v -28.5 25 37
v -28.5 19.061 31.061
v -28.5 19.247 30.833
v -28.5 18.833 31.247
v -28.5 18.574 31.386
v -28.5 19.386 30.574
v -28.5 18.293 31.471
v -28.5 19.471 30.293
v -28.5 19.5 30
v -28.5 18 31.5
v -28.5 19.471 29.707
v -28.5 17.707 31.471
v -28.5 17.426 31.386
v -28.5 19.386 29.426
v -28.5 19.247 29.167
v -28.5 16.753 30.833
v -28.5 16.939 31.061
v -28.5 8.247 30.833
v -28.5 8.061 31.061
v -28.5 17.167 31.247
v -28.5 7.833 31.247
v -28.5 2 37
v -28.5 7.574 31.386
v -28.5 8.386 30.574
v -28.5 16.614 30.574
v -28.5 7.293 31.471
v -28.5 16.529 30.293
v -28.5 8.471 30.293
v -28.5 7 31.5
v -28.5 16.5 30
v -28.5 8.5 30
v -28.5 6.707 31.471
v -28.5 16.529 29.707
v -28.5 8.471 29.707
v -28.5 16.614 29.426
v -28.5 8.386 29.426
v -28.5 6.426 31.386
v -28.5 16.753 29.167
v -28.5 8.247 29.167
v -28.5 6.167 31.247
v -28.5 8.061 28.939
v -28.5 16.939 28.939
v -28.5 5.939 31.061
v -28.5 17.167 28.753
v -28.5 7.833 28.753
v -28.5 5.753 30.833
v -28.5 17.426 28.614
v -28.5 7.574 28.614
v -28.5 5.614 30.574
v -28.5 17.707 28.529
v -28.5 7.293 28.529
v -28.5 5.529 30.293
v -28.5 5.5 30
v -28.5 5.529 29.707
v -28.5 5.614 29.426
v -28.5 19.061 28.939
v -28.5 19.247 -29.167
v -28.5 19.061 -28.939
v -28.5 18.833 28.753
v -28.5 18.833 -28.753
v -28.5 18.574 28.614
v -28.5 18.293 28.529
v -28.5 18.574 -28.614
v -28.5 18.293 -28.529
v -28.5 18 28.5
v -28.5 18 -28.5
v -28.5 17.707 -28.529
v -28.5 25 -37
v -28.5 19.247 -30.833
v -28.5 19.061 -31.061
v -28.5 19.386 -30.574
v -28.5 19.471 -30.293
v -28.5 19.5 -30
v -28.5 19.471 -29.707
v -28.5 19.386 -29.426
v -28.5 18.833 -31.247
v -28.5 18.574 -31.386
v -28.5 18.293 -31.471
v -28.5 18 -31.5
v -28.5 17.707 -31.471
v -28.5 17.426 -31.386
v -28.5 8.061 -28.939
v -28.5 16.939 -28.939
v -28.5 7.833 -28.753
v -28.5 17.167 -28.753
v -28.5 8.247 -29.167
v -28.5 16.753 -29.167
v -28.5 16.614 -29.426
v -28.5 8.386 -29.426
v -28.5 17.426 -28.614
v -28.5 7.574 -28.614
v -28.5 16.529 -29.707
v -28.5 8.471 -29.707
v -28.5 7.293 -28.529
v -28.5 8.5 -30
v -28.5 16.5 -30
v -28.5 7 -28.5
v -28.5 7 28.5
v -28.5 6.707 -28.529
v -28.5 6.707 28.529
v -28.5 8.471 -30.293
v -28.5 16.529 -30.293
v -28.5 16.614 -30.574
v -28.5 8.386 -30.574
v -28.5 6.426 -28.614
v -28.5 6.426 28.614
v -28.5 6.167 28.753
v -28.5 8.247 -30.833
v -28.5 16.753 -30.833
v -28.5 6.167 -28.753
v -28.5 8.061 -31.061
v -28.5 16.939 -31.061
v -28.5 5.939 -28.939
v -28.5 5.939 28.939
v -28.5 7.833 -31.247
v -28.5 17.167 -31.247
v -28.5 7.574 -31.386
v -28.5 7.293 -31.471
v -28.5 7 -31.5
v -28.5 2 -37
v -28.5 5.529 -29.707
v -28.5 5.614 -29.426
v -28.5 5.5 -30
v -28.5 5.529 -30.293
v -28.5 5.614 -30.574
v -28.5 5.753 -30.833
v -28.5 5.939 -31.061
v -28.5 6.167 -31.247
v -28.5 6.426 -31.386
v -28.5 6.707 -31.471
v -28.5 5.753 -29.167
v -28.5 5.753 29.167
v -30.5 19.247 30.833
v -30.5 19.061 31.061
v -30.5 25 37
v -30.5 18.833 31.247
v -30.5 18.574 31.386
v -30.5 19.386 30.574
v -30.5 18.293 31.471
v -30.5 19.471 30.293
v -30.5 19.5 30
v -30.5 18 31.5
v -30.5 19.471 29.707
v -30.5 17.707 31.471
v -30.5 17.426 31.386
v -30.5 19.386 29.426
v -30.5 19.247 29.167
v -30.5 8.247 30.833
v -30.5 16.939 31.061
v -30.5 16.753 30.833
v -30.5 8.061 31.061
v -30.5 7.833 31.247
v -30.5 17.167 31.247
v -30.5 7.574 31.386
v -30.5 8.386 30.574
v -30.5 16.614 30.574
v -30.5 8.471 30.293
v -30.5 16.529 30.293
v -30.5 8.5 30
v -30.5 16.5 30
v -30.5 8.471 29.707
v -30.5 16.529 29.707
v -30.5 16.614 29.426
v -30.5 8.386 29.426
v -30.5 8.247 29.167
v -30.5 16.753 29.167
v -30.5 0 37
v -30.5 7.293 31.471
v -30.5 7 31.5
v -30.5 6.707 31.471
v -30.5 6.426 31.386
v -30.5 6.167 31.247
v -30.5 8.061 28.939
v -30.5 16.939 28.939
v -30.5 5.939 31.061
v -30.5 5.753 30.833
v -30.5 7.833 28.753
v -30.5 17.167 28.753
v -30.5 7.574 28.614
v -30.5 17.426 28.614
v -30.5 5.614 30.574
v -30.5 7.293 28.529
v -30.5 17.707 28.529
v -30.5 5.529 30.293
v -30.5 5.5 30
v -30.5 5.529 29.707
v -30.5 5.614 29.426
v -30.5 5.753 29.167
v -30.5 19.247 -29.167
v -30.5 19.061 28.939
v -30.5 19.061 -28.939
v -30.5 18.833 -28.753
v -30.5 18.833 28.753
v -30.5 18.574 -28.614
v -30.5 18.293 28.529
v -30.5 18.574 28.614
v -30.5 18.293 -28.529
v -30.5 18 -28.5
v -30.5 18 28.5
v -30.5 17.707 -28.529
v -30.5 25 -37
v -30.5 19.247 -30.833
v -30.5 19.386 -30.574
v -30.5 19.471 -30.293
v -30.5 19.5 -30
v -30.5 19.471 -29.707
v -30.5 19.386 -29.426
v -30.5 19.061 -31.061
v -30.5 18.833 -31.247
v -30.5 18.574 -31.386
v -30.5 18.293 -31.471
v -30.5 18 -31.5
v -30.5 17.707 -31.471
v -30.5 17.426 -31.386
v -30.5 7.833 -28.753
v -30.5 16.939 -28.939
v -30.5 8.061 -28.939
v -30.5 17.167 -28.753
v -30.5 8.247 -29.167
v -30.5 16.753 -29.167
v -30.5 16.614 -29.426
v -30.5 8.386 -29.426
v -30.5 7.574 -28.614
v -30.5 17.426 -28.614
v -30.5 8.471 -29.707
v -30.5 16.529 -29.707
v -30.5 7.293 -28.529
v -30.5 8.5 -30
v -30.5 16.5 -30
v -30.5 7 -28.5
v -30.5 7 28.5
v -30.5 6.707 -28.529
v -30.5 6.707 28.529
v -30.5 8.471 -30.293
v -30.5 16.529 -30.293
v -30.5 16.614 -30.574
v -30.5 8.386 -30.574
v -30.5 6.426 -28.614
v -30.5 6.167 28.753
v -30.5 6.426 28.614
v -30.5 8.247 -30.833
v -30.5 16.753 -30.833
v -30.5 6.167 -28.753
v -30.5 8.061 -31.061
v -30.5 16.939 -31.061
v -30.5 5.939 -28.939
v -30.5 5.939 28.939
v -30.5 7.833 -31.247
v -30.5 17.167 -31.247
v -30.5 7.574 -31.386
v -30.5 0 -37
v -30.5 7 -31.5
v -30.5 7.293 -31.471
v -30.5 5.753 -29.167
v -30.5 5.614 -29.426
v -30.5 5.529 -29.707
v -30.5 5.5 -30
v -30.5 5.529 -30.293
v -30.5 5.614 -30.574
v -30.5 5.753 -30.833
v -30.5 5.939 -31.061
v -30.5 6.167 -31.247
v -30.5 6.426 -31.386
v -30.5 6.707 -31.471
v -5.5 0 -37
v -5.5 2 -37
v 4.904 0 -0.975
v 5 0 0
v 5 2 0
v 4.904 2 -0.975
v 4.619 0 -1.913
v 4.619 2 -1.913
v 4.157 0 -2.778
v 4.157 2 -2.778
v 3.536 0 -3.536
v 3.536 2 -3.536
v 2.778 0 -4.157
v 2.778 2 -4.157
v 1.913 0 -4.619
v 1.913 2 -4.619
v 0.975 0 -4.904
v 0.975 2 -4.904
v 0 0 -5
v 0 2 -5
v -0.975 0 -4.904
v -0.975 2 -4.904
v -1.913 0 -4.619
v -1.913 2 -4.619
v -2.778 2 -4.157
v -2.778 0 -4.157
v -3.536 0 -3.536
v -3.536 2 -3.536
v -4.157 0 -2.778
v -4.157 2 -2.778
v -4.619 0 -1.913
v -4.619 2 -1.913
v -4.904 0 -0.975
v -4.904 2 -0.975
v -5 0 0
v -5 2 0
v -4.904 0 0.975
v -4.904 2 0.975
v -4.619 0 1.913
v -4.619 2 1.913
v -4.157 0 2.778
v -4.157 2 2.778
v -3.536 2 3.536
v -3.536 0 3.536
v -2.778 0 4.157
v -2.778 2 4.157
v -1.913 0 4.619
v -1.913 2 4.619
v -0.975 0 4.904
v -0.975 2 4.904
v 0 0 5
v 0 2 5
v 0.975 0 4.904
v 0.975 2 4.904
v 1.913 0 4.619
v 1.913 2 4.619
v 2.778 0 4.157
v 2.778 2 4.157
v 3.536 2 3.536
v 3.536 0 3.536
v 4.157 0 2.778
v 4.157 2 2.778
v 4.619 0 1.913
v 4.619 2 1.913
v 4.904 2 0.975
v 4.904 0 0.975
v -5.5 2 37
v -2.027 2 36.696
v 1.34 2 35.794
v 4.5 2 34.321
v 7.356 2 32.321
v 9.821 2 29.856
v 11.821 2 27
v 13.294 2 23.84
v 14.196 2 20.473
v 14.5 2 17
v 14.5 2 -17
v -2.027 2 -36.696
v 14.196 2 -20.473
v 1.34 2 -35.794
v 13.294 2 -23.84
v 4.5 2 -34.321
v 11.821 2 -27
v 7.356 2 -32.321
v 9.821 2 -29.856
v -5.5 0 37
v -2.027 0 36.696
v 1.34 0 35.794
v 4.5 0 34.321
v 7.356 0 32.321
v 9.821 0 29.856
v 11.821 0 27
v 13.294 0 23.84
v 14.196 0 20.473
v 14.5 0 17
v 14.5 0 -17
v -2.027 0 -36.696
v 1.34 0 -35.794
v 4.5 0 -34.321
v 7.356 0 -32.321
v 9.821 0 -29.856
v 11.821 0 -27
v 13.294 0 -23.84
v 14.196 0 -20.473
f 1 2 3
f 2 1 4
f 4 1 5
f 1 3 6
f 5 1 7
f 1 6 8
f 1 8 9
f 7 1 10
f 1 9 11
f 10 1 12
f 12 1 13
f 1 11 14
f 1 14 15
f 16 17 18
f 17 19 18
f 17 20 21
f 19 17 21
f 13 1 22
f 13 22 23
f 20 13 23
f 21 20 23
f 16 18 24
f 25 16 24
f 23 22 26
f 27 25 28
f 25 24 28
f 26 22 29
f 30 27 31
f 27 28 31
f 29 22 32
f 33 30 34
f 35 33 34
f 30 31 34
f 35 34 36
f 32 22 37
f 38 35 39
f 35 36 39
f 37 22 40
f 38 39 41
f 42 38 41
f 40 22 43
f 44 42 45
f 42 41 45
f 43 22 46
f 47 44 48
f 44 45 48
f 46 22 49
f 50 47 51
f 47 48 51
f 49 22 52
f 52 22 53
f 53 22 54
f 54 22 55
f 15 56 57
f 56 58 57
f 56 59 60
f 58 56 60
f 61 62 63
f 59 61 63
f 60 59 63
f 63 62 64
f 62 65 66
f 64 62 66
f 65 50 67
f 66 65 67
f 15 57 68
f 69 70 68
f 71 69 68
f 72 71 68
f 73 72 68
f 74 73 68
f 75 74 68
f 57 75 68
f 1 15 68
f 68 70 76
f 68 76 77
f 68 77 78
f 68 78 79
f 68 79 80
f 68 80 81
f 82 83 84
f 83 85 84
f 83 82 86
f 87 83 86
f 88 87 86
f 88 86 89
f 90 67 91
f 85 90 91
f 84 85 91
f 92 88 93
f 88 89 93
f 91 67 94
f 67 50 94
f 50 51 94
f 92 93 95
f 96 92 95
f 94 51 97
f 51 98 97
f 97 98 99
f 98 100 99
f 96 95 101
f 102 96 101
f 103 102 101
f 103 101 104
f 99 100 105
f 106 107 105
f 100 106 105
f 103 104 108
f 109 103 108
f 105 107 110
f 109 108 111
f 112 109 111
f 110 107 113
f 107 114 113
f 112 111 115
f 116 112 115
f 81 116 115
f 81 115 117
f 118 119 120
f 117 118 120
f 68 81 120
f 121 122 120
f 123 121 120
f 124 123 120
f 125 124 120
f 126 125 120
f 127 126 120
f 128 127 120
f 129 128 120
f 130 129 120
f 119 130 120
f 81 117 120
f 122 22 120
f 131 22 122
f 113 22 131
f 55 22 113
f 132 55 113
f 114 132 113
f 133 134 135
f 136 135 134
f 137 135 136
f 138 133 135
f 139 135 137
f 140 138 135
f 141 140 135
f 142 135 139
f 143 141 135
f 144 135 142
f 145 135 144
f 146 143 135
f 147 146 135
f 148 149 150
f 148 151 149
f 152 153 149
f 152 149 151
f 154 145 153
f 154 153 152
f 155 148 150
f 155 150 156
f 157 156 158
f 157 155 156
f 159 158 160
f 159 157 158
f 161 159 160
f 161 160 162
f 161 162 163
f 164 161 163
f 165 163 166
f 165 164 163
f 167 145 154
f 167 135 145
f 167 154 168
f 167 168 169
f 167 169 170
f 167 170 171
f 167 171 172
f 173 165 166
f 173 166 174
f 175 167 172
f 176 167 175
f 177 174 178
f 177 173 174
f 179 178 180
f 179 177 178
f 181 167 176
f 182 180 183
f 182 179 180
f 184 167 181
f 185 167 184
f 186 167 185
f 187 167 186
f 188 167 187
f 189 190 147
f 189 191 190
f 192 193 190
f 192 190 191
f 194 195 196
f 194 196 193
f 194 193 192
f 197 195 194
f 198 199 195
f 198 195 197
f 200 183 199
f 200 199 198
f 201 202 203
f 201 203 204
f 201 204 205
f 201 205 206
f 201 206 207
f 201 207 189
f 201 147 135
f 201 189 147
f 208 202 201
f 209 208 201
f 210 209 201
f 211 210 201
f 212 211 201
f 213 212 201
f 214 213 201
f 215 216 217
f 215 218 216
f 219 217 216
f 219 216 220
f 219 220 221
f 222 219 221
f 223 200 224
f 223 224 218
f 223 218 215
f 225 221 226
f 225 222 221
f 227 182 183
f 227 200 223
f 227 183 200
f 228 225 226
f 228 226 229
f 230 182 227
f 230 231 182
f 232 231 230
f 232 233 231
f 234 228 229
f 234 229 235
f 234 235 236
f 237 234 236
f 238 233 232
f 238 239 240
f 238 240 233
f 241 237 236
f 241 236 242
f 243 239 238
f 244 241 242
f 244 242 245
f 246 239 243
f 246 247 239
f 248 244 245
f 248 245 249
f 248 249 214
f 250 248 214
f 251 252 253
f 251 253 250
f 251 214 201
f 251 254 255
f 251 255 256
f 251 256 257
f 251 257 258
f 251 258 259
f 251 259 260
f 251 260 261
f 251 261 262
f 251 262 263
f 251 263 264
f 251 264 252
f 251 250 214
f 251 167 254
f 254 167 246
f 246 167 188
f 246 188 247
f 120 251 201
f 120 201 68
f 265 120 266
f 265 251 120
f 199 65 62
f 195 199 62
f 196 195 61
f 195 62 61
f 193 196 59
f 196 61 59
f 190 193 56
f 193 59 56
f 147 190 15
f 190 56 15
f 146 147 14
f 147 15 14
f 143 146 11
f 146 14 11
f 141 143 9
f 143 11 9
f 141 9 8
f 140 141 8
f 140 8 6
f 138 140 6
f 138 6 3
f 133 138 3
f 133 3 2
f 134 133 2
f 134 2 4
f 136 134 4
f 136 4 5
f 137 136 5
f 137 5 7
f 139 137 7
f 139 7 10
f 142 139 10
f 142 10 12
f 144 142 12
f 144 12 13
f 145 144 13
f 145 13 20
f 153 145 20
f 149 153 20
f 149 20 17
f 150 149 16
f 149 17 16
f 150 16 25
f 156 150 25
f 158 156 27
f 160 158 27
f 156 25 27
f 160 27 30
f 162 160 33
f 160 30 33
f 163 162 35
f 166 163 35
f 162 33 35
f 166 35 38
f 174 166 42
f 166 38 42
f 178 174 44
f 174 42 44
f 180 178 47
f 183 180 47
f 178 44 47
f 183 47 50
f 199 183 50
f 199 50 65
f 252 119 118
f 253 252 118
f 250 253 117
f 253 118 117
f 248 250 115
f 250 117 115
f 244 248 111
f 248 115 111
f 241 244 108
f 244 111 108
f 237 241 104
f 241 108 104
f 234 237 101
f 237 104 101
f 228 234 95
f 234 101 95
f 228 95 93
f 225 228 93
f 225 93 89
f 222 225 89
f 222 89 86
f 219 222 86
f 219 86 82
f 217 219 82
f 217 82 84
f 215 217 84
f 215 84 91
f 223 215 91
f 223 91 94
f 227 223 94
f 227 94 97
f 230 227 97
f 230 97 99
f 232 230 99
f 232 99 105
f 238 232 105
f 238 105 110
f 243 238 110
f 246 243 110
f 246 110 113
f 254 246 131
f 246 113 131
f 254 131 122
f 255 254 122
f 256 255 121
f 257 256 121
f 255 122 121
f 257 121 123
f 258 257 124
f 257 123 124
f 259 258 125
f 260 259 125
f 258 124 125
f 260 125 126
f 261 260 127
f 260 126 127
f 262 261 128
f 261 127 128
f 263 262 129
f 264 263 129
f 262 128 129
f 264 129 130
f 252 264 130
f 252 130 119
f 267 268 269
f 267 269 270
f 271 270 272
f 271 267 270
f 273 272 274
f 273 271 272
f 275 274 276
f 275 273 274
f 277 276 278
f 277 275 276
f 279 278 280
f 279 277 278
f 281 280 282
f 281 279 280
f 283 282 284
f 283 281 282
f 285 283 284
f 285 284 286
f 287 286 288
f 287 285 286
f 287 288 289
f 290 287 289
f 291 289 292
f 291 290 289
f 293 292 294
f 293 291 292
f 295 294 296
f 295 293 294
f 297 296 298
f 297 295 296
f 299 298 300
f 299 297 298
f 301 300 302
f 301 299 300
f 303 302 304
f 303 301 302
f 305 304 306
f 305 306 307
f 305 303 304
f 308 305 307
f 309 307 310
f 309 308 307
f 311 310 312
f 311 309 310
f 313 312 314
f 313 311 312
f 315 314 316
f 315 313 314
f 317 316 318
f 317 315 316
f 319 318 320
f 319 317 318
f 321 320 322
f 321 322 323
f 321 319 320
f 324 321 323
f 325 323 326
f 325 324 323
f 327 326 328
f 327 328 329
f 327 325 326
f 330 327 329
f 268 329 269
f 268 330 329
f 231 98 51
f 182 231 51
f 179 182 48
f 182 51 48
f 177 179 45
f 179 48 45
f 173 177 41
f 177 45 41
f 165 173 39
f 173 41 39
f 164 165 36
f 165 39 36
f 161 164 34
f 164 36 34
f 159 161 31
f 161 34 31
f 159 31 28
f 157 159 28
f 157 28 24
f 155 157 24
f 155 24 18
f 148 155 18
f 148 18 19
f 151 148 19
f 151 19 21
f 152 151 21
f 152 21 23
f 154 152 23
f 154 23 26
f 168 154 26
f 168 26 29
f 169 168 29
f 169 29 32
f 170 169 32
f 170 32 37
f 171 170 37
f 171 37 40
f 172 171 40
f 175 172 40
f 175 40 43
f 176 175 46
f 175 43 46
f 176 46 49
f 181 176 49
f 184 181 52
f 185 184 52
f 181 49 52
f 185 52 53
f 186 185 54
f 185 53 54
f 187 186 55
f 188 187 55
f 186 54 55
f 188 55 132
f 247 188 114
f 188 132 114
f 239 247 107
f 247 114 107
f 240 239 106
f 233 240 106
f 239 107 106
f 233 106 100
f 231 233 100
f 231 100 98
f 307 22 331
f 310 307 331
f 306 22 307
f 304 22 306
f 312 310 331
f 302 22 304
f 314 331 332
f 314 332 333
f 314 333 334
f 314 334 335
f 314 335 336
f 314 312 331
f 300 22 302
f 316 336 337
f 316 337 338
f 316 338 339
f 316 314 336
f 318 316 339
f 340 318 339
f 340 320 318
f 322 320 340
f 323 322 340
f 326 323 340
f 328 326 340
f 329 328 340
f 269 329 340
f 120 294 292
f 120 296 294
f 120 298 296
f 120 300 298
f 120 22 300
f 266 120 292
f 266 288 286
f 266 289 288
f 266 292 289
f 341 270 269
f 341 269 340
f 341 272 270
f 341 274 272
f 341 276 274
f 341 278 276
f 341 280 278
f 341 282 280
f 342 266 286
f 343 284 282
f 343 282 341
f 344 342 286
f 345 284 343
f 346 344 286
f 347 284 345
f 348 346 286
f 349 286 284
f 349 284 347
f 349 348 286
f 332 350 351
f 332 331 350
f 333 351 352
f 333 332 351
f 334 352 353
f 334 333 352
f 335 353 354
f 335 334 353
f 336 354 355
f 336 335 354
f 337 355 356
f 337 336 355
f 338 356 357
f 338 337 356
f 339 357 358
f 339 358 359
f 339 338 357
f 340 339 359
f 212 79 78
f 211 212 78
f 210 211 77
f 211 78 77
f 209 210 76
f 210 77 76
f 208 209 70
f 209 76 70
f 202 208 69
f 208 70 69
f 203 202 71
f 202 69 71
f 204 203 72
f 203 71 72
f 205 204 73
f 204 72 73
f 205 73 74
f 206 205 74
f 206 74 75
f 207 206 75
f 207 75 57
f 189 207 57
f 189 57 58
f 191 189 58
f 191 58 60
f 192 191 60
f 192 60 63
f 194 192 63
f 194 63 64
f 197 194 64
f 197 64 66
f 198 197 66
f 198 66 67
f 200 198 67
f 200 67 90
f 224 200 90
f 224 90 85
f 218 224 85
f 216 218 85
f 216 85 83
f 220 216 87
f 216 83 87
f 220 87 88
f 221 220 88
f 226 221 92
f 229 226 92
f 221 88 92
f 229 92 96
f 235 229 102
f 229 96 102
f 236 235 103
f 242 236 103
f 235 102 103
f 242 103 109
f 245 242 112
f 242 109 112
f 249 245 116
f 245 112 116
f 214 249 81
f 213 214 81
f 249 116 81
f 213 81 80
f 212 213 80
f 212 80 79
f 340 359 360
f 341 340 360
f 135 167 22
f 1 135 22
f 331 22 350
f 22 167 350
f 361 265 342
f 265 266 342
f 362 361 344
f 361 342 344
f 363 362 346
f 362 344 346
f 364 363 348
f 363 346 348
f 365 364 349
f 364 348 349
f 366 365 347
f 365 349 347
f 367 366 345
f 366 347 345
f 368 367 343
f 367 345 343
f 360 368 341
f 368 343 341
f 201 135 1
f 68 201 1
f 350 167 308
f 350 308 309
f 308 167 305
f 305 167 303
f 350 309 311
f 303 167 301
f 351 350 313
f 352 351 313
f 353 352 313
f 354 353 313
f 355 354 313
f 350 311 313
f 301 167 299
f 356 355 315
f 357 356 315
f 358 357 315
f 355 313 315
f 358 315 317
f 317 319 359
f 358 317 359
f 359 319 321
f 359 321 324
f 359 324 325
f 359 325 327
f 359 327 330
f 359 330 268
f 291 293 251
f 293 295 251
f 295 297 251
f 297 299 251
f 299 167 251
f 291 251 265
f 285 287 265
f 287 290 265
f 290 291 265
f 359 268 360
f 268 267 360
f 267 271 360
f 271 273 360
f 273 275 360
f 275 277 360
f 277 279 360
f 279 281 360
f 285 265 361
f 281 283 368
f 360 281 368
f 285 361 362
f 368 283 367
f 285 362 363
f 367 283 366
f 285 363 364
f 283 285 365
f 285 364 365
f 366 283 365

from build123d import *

# Parameters (mm, degrees)
SKETCH1_W               = 45
SKETCH1_H               = 74
SKETCH1_R               = 5
BOSS_EXTRUDE1_DEPTH     = 2
SKETCH2_W               = 2
SKETCH2_H               = 74
BOSS_EXTRUDE2_DEPTH     = 23
SKETCH3_R               = 1.5
CUT_EXTRUDE1_DEPTH      = 44
CUT_EXTRUDE1_DEPTH_BACK = 3
FILLET1_R               = 20


with BuildPart() as part:
    # Sketch1 → Boss-Extrude1 (new body)
    with BuildSketch(Plane(origin=(0, 0, 0), x_dir=(1, 0, 0), z_dir=(0, 1, 0))):
        with Locations((-8, 0)):
            Rectangle(SKETCH1_W, SKETCH1_H)
        Circle(SKETCH1_R, mode=Mode.SUBTRACT)
    extrude(amount=BOSS_EXTRUDE1_DEPTH)

    # Sketch2 → Boss-Extrude2 (add)
    with BuildSketch(Plane(origin=(0, 2, 0), x_dir=(1, 0, 0), z_dir=(0, 1, 0))):
        with Locations((-29.5, 0)):
            Rectangle(SKETCH2_W, SKETCH2_H)
    extrude(amount=BOSS_EXTRUDE2_DEPTH)

    # Sketch3 → Cut-Extrude1 (cut, two sides)
    with BuildSketch(Plane(origin=(-28.5, 0, 0), x_dir=(0, 0, -1), z_dir=(1, 0, 0))) as cut_extrude1_sk:
        with Locations((-30, 18)):
            Circle(SKETCH3_R)
        with Locations((-30, 7)):
            Circle(SKETCH3_R)
        with Locations((30, 7)):
            Circle(SKETCH3_R)
        with Locations((30, 18)):
            Circle(SKETCH3_R)
    extrude(amount=CUT_EXTRUDE1_DEPTH, mode=Mode.SUBTRACT)
    extrude(cut_extrude1_sk.sketch, amount=-CUT_EXTRUDE1_DEPTH_BACK, mode=Mode.SUBTRACT)

    # Fillet1
    fillet1_edges = [part.edges().sort_by_distance(p)[0] for p in [
        (14.5, 1, -37),
        (14.5, 1, 37),
    ]]
    fillet(fillet1_edges, radius=FILLET1_R)


solid = part.part
